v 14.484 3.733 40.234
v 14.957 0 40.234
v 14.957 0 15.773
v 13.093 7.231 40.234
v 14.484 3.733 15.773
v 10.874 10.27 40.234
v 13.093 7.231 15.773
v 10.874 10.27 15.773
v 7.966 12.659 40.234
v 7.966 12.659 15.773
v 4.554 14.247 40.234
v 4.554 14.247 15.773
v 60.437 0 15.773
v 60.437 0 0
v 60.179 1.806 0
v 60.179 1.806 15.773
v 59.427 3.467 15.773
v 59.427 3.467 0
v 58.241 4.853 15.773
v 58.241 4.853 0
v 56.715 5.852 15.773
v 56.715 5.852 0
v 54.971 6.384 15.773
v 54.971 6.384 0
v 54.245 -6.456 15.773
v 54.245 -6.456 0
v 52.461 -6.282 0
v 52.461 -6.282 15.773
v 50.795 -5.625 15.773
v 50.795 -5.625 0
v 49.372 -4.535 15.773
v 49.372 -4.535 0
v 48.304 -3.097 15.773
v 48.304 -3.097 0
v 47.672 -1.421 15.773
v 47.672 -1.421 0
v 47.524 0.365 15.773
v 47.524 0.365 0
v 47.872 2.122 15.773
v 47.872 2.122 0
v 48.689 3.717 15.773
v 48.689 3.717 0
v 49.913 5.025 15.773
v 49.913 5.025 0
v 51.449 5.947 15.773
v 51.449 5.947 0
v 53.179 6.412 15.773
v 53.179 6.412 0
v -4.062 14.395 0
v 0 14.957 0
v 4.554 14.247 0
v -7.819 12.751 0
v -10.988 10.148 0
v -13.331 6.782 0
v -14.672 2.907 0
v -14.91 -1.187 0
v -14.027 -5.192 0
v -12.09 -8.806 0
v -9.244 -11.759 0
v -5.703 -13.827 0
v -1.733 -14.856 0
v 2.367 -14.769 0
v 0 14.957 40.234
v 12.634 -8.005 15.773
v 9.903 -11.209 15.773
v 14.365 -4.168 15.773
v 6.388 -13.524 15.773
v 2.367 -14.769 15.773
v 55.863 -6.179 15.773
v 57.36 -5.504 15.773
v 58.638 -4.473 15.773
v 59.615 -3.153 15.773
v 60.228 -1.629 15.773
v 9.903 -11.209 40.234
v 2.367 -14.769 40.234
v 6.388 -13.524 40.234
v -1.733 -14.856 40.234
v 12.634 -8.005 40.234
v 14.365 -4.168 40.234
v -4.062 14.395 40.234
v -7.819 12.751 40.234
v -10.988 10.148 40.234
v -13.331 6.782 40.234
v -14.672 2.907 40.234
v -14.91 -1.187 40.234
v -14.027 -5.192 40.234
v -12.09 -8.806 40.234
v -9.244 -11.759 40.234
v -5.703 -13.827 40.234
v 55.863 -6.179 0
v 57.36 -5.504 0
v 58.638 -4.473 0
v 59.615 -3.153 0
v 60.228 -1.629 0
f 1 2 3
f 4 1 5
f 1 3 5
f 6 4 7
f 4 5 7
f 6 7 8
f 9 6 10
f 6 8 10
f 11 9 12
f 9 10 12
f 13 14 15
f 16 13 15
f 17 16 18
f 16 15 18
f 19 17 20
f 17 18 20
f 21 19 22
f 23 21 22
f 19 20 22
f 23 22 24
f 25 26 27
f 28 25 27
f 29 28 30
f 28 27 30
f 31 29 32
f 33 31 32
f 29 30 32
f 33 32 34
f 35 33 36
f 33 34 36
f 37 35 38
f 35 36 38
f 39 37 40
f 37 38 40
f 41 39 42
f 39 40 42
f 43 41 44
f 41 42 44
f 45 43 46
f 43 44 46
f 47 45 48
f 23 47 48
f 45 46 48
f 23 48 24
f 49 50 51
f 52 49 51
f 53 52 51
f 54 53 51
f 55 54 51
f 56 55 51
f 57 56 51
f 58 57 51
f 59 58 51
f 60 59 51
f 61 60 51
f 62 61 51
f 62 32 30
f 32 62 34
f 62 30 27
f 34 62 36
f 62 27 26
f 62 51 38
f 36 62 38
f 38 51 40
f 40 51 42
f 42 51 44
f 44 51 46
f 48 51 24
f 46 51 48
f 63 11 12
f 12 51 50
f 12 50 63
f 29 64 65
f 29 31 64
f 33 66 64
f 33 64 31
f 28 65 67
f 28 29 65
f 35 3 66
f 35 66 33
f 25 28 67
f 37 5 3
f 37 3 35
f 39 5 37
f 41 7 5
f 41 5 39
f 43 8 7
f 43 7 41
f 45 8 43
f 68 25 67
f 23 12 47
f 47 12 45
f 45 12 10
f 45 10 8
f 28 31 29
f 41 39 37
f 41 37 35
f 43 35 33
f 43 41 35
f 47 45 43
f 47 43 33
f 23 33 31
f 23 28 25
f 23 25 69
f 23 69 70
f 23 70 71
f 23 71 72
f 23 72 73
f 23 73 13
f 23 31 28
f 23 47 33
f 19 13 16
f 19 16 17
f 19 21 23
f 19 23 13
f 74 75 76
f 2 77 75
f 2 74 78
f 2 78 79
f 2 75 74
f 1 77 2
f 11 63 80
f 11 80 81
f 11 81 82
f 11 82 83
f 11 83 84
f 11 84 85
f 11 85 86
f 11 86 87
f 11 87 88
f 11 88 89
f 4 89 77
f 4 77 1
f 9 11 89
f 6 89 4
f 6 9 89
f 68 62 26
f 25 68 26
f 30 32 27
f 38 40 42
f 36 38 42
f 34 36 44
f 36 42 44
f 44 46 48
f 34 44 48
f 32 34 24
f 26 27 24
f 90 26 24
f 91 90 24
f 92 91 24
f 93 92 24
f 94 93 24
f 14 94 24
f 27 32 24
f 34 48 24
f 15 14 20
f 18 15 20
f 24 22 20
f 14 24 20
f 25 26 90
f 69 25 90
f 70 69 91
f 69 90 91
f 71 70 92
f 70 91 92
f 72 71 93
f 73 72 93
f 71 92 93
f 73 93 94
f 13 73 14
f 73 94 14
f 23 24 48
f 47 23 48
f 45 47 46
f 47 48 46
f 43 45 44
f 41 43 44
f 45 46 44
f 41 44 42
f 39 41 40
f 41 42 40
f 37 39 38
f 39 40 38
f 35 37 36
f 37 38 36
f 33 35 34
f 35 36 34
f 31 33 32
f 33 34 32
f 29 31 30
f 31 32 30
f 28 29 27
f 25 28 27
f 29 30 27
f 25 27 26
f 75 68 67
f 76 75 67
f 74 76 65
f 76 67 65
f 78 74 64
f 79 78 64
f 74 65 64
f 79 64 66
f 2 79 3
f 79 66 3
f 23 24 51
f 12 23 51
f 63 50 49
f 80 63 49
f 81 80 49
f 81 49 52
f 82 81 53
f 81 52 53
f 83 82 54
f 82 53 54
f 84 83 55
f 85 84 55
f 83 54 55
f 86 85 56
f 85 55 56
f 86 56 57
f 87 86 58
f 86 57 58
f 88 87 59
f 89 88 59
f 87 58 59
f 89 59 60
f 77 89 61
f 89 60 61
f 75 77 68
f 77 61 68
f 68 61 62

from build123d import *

# Parameters (mm, degrees)
F3_DEPTH = 15.7734
F4_DEPTH = 40.2336


with BuildPart() as f3:
    # F1 (on face) → F3 (new body)
    with BuildSketch(Plane.XY):
        with BuildLine():
            Line((2.3665023004, -14.7686997904), (54.2445329823, -6.4558851165))
            ThreePointArc((54.2445329823, -6.4558851165), (47.5237977676, 0.3648156016), (54.9706478921, 6.3843391154))
            Line((54.9706478921, 6.3843391154), (4.5544000586, 14.246833569))
            ThreePointArc((4.5544000586, 14.246833569), (12.0796407574, 8.8202667652), (14.9570995396, 0))
            ThreePointArc((14.9570995396, 0), (11.3822413677, -9.7035770768), (2.3665023004, -14.7686997904))
        make_face()
    extrude(amount=F3_DEPTH)

    # F0 (on Top) → F4 (join)
    with BuildSketch(Plane.XY):
        with BuildLine():
            ThreePointArc((14.9570995396, 0), (12.0796407574, 8.8202667652), (4.5544000586, 14.246833569))
            Line((4.5544000586, 14.246833569), (0, 14.9570995396))
            ThreePointArc((0, 14.9570995396), (-14.9099252089, -1.1869949034), (2.3665023004, -14.7686997904))
            ThreePointArc((2.3665023004, -14.7686997904), (11.3822413677, -9.7035770768), (14.9570995396, 0))
        make_face()
    extrude(amount=F4_DEPTH)


with BuildPart() as f3b:
    # F2 (on face) → F3, piece 2 (new body)
    with BuildSketch(Plane.XY):
        with BuildLine():
            ThreePointArc((54.9706478921, 6.3843391154), (47.5237977676, 0.3648156016), (54.2445329823, -6.4558851165))
            ThreePointArc((54.2445329823, -6.4558851165), (58.6382976798, -4.472667595), (60.4365091632, 0))
            ThreePointArc((60.4365091632, 0), (58.8833851033, 4.2022442033), (54.9706478921, 6.3843391154))
        make_face()
    extrude(amount=F3_DEPTH)


solid = Compound([f3.part, f3b.part])
